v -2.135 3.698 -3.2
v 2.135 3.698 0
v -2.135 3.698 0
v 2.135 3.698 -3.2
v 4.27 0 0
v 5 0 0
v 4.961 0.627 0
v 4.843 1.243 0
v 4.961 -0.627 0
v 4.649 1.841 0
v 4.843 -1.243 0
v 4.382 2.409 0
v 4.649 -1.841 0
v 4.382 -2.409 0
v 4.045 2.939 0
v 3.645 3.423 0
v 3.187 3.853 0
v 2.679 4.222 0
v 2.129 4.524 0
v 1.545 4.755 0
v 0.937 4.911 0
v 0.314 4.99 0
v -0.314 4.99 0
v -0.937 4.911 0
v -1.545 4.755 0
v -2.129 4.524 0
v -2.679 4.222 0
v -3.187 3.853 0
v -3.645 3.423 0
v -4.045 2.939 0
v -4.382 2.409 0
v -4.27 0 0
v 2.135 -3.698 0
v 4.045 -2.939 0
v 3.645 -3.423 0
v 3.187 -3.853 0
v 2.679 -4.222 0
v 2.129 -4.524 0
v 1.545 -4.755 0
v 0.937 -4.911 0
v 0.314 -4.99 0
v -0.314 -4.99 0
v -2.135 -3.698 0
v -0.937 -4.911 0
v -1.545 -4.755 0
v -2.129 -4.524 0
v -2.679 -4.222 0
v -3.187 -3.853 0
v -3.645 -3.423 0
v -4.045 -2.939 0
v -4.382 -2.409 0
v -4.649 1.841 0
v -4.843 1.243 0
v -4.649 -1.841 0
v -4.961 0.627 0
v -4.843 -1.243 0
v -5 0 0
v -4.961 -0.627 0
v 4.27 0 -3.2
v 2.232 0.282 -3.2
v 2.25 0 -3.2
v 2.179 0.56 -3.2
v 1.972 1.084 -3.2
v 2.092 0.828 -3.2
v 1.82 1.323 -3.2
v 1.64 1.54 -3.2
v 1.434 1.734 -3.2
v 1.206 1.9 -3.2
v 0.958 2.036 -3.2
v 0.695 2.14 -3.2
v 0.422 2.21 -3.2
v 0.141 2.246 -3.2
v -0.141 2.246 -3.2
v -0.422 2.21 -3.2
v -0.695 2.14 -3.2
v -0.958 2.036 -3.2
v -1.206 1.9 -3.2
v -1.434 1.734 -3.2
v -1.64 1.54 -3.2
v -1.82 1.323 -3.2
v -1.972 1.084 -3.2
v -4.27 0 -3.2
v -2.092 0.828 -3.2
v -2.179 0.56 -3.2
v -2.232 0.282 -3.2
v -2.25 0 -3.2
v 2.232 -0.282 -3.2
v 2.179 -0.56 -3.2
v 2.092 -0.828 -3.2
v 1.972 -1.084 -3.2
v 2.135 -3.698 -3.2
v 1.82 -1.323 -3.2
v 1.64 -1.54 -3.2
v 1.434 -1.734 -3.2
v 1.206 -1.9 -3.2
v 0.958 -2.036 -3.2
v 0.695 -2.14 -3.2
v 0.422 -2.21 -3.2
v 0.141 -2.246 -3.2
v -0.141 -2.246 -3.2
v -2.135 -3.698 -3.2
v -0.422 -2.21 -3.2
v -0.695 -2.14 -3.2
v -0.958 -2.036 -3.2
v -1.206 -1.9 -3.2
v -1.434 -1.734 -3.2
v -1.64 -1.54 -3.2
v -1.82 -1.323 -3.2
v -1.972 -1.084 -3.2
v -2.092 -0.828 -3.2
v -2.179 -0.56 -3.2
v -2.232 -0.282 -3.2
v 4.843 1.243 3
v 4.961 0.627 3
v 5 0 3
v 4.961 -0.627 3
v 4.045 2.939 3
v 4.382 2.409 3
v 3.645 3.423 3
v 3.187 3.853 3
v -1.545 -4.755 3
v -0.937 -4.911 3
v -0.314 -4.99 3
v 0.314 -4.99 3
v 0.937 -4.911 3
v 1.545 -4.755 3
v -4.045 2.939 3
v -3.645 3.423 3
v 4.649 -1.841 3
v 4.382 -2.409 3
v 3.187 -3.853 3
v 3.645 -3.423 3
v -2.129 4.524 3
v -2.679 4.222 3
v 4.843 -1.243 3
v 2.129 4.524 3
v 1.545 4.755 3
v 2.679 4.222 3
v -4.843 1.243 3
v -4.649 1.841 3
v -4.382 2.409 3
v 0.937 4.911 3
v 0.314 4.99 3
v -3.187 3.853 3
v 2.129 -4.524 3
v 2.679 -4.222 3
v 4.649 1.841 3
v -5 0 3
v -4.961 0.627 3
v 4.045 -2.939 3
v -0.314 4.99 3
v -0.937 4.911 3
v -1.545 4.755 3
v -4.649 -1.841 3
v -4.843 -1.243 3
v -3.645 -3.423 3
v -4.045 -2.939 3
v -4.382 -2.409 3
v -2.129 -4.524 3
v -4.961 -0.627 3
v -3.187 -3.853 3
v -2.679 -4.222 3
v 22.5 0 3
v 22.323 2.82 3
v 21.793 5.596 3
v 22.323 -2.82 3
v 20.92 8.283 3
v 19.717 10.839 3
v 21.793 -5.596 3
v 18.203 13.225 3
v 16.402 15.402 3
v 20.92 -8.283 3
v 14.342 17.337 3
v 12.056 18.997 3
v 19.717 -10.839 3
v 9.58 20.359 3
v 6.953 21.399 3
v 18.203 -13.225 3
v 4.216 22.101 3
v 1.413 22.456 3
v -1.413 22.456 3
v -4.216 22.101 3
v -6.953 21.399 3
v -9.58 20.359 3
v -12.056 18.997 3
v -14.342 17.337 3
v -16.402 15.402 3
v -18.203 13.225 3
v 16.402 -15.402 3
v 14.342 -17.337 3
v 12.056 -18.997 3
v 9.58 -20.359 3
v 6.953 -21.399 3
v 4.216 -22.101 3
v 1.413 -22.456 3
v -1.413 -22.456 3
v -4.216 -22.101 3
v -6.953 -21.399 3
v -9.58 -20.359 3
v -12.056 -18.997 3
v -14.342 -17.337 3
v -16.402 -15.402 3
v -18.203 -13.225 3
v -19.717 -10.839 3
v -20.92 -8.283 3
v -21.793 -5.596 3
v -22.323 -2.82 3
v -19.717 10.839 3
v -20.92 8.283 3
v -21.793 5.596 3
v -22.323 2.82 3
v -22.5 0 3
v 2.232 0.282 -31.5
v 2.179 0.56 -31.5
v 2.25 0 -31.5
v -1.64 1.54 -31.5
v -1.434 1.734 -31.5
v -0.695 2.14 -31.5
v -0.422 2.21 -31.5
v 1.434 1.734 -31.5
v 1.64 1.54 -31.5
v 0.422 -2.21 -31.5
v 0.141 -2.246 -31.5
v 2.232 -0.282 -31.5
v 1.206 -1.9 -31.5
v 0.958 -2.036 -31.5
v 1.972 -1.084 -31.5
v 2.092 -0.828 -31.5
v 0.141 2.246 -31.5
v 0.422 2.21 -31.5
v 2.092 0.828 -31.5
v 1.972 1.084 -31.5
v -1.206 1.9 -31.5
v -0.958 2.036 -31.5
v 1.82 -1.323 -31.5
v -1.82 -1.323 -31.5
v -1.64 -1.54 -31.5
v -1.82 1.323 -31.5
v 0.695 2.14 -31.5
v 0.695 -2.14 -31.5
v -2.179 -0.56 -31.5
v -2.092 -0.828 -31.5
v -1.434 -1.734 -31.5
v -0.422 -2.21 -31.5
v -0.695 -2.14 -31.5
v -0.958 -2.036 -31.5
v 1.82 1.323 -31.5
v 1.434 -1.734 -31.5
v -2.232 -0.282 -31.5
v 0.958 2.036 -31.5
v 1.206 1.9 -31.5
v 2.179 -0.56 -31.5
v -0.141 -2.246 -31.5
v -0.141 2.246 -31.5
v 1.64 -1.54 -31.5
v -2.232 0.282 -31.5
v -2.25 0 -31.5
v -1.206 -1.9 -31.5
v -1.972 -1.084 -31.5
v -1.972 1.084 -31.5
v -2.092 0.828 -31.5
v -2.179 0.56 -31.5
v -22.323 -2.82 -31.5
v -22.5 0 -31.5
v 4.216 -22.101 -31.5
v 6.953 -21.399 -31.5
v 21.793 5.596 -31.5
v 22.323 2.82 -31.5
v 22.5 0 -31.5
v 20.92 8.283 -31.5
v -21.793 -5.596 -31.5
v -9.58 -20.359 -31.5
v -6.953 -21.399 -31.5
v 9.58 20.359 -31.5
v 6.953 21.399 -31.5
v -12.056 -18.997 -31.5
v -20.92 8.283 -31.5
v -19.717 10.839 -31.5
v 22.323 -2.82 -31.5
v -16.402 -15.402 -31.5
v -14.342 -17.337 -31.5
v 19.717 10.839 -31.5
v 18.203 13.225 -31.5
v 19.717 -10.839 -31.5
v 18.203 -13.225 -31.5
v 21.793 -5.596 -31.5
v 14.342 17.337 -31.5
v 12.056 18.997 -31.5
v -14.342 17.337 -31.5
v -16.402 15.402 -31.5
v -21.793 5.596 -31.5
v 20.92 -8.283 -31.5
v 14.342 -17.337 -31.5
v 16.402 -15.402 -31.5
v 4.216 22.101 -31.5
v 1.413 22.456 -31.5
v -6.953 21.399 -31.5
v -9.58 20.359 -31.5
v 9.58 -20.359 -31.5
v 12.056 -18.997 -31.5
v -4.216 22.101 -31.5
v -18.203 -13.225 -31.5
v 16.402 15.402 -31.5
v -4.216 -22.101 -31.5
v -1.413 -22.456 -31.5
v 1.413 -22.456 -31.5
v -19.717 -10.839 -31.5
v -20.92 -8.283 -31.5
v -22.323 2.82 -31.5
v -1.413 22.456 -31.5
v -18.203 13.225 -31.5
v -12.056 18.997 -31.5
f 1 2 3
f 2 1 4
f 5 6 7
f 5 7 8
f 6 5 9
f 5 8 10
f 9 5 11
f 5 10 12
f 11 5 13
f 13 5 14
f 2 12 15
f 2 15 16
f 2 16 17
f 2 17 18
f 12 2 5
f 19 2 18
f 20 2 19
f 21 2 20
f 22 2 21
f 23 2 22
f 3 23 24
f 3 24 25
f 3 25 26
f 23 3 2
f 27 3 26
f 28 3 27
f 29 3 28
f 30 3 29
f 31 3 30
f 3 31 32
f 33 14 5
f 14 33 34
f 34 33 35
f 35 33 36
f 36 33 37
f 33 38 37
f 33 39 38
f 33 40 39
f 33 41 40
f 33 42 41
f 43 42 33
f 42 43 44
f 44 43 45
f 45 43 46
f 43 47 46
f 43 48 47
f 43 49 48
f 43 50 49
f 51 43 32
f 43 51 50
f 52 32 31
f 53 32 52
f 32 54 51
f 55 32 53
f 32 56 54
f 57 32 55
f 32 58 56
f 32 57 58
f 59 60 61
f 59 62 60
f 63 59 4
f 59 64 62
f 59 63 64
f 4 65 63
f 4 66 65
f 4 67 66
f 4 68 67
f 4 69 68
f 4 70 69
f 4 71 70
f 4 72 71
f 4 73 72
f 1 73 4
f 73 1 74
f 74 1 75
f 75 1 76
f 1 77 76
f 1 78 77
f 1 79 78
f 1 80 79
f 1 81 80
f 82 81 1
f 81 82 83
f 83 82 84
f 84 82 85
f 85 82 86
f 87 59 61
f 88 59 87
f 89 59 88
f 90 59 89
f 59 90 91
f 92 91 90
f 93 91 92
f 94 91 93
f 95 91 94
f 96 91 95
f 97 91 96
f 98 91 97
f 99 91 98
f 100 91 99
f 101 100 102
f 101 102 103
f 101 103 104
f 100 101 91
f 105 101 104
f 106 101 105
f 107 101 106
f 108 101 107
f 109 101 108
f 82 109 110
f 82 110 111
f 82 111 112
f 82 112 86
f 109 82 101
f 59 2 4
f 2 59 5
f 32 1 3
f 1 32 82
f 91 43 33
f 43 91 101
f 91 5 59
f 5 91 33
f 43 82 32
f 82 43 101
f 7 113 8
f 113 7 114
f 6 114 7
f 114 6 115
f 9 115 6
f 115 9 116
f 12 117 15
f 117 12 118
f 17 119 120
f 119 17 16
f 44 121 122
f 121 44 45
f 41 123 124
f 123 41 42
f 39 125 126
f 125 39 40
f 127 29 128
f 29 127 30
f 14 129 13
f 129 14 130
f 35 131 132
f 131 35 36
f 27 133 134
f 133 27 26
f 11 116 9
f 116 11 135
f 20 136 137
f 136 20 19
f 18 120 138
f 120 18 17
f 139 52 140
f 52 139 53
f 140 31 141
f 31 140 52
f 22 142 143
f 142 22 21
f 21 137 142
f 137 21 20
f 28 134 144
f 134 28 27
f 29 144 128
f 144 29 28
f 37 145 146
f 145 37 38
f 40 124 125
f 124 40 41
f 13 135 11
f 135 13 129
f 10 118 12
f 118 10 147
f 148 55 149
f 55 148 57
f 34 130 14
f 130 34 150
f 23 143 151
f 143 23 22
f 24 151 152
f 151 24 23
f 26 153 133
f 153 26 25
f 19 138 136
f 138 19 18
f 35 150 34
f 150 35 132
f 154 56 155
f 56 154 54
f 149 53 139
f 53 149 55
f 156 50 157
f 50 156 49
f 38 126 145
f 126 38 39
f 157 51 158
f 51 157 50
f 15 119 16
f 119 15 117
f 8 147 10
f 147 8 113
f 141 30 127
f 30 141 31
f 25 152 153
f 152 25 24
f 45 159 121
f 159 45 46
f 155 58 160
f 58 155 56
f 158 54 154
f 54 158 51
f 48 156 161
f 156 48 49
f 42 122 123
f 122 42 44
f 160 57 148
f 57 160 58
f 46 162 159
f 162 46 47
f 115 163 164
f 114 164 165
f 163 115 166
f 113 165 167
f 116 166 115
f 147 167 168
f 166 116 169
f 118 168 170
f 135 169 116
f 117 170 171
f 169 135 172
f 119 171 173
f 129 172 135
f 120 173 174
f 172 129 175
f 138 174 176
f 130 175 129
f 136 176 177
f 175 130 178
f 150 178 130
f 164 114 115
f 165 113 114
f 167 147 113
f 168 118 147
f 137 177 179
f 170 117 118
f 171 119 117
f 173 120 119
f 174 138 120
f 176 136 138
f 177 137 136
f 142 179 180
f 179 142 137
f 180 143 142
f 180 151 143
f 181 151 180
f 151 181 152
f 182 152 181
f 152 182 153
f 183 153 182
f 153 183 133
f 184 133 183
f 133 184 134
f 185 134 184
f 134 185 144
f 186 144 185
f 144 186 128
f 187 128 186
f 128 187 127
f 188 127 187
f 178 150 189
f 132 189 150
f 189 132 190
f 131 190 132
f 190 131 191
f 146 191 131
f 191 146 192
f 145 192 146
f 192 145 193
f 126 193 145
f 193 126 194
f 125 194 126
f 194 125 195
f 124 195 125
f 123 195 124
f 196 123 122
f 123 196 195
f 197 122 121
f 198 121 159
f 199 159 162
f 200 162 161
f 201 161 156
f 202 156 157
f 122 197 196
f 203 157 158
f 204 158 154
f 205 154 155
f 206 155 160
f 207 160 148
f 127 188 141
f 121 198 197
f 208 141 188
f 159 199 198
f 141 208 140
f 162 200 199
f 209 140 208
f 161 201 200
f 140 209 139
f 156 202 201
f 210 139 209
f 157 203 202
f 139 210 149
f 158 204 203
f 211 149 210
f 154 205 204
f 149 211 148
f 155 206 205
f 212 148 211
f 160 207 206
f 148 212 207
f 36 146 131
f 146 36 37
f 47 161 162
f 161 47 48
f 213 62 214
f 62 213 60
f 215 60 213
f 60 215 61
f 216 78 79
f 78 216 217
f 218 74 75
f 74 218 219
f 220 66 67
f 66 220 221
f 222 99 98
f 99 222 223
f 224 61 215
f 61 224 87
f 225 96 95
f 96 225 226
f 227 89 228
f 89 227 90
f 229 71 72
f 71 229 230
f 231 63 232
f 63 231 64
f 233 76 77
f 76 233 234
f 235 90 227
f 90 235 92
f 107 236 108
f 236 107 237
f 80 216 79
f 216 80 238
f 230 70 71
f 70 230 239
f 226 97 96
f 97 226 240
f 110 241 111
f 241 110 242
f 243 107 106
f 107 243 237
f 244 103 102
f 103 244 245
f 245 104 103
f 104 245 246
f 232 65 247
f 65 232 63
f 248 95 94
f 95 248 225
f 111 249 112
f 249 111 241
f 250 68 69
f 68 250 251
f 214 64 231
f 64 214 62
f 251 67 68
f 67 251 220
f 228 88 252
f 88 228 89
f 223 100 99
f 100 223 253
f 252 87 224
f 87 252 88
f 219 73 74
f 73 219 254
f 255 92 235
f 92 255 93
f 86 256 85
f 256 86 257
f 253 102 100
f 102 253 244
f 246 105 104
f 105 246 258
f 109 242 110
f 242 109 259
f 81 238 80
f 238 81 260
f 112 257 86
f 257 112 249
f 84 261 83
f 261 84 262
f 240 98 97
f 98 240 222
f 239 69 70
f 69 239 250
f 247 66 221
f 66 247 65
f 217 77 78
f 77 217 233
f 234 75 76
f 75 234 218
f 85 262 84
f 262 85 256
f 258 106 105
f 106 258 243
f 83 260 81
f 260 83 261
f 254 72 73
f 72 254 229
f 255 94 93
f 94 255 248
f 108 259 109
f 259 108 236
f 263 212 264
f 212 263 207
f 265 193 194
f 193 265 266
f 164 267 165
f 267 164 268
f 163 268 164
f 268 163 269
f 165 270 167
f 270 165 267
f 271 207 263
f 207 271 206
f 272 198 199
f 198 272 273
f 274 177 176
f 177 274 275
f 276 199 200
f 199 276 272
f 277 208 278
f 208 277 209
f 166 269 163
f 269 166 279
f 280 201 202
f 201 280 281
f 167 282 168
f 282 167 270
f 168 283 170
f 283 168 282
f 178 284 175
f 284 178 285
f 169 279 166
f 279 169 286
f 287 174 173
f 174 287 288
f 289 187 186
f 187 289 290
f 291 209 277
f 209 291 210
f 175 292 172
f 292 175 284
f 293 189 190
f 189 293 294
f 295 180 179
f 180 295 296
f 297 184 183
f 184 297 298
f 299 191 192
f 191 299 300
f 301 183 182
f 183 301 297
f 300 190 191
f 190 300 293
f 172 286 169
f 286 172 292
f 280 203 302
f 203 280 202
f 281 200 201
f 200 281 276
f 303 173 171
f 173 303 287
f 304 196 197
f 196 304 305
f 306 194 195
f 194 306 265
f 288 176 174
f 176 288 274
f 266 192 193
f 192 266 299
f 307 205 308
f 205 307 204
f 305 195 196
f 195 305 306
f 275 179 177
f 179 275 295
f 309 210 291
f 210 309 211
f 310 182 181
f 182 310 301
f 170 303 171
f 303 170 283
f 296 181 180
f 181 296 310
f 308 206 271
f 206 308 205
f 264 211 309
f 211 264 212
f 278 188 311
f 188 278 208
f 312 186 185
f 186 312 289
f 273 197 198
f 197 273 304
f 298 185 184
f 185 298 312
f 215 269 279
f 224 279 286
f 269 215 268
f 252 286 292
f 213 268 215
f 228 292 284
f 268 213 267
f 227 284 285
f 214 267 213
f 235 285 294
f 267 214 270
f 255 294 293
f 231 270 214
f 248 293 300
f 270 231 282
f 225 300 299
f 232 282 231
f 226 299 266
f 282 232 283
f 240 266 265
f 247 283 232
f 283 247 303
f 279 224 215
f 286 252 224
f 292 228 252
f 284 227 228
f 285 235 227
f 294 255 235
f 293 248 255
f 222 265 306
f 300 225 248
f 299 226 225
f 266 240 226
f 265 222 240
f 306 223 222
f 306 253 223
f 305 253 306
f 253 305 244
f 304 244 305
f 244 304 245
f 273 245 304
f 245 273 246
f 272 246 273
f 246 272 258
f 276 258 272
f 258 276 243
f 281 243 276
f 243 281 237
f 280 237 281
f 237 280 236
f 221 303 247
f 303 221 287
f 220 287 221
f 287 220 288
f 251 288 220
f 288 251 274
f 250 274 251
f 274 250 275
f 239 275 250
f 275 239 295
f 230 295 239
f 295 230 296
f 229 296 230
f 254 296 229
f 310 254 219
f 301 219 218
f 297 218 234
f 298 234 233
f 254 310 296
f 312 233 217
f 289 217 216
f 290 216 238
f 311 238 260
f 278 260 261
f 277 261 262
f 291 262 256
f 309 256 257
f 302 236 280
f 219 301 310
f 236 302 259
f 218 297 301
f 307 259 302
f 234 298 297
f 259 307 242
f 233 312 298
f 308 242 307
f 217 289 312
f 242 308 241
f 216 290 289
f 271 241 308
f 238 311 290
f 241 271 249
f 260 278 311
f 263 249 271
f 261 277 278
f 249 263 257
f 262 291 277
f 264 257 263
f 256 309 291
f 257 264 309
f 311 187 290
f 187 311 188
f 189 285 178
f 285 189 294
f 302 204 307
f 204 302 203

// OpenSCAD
$fn = 50;

difference() {
	union() {
		translate(v = [0, 0, -31.5]) {
			cylinder(h = 34.5, r = 22.5);
		}
	}
	union() {
		translate(v = [0, 0, 0]) {
			rotate(a = [0, 0, 0]) {
				difference() {
					union() {
						translate(v = [0, 0, -3.2]) {
							linear_extrude(height = 3.2) {
								polygon(points = [[4.2698, 0.0], [2.1349000000000005, 3.697755269078796], [-2.134899999999999, 3.6977552690787965], [-4.2698, 5.228996902999369e-16], [-2.134900000000002, -3.6977552690787956], [2.1348999999999974, -3.697755269078798]]);
							}
						}
					}
					union();
				}
			}
		}
		#cylinder(h = 3, r = 5.0);
		#translate(v = [0, 0, -100.0]) {
			cylinder(h = 200, r = 2.25);
		}
	}
}
